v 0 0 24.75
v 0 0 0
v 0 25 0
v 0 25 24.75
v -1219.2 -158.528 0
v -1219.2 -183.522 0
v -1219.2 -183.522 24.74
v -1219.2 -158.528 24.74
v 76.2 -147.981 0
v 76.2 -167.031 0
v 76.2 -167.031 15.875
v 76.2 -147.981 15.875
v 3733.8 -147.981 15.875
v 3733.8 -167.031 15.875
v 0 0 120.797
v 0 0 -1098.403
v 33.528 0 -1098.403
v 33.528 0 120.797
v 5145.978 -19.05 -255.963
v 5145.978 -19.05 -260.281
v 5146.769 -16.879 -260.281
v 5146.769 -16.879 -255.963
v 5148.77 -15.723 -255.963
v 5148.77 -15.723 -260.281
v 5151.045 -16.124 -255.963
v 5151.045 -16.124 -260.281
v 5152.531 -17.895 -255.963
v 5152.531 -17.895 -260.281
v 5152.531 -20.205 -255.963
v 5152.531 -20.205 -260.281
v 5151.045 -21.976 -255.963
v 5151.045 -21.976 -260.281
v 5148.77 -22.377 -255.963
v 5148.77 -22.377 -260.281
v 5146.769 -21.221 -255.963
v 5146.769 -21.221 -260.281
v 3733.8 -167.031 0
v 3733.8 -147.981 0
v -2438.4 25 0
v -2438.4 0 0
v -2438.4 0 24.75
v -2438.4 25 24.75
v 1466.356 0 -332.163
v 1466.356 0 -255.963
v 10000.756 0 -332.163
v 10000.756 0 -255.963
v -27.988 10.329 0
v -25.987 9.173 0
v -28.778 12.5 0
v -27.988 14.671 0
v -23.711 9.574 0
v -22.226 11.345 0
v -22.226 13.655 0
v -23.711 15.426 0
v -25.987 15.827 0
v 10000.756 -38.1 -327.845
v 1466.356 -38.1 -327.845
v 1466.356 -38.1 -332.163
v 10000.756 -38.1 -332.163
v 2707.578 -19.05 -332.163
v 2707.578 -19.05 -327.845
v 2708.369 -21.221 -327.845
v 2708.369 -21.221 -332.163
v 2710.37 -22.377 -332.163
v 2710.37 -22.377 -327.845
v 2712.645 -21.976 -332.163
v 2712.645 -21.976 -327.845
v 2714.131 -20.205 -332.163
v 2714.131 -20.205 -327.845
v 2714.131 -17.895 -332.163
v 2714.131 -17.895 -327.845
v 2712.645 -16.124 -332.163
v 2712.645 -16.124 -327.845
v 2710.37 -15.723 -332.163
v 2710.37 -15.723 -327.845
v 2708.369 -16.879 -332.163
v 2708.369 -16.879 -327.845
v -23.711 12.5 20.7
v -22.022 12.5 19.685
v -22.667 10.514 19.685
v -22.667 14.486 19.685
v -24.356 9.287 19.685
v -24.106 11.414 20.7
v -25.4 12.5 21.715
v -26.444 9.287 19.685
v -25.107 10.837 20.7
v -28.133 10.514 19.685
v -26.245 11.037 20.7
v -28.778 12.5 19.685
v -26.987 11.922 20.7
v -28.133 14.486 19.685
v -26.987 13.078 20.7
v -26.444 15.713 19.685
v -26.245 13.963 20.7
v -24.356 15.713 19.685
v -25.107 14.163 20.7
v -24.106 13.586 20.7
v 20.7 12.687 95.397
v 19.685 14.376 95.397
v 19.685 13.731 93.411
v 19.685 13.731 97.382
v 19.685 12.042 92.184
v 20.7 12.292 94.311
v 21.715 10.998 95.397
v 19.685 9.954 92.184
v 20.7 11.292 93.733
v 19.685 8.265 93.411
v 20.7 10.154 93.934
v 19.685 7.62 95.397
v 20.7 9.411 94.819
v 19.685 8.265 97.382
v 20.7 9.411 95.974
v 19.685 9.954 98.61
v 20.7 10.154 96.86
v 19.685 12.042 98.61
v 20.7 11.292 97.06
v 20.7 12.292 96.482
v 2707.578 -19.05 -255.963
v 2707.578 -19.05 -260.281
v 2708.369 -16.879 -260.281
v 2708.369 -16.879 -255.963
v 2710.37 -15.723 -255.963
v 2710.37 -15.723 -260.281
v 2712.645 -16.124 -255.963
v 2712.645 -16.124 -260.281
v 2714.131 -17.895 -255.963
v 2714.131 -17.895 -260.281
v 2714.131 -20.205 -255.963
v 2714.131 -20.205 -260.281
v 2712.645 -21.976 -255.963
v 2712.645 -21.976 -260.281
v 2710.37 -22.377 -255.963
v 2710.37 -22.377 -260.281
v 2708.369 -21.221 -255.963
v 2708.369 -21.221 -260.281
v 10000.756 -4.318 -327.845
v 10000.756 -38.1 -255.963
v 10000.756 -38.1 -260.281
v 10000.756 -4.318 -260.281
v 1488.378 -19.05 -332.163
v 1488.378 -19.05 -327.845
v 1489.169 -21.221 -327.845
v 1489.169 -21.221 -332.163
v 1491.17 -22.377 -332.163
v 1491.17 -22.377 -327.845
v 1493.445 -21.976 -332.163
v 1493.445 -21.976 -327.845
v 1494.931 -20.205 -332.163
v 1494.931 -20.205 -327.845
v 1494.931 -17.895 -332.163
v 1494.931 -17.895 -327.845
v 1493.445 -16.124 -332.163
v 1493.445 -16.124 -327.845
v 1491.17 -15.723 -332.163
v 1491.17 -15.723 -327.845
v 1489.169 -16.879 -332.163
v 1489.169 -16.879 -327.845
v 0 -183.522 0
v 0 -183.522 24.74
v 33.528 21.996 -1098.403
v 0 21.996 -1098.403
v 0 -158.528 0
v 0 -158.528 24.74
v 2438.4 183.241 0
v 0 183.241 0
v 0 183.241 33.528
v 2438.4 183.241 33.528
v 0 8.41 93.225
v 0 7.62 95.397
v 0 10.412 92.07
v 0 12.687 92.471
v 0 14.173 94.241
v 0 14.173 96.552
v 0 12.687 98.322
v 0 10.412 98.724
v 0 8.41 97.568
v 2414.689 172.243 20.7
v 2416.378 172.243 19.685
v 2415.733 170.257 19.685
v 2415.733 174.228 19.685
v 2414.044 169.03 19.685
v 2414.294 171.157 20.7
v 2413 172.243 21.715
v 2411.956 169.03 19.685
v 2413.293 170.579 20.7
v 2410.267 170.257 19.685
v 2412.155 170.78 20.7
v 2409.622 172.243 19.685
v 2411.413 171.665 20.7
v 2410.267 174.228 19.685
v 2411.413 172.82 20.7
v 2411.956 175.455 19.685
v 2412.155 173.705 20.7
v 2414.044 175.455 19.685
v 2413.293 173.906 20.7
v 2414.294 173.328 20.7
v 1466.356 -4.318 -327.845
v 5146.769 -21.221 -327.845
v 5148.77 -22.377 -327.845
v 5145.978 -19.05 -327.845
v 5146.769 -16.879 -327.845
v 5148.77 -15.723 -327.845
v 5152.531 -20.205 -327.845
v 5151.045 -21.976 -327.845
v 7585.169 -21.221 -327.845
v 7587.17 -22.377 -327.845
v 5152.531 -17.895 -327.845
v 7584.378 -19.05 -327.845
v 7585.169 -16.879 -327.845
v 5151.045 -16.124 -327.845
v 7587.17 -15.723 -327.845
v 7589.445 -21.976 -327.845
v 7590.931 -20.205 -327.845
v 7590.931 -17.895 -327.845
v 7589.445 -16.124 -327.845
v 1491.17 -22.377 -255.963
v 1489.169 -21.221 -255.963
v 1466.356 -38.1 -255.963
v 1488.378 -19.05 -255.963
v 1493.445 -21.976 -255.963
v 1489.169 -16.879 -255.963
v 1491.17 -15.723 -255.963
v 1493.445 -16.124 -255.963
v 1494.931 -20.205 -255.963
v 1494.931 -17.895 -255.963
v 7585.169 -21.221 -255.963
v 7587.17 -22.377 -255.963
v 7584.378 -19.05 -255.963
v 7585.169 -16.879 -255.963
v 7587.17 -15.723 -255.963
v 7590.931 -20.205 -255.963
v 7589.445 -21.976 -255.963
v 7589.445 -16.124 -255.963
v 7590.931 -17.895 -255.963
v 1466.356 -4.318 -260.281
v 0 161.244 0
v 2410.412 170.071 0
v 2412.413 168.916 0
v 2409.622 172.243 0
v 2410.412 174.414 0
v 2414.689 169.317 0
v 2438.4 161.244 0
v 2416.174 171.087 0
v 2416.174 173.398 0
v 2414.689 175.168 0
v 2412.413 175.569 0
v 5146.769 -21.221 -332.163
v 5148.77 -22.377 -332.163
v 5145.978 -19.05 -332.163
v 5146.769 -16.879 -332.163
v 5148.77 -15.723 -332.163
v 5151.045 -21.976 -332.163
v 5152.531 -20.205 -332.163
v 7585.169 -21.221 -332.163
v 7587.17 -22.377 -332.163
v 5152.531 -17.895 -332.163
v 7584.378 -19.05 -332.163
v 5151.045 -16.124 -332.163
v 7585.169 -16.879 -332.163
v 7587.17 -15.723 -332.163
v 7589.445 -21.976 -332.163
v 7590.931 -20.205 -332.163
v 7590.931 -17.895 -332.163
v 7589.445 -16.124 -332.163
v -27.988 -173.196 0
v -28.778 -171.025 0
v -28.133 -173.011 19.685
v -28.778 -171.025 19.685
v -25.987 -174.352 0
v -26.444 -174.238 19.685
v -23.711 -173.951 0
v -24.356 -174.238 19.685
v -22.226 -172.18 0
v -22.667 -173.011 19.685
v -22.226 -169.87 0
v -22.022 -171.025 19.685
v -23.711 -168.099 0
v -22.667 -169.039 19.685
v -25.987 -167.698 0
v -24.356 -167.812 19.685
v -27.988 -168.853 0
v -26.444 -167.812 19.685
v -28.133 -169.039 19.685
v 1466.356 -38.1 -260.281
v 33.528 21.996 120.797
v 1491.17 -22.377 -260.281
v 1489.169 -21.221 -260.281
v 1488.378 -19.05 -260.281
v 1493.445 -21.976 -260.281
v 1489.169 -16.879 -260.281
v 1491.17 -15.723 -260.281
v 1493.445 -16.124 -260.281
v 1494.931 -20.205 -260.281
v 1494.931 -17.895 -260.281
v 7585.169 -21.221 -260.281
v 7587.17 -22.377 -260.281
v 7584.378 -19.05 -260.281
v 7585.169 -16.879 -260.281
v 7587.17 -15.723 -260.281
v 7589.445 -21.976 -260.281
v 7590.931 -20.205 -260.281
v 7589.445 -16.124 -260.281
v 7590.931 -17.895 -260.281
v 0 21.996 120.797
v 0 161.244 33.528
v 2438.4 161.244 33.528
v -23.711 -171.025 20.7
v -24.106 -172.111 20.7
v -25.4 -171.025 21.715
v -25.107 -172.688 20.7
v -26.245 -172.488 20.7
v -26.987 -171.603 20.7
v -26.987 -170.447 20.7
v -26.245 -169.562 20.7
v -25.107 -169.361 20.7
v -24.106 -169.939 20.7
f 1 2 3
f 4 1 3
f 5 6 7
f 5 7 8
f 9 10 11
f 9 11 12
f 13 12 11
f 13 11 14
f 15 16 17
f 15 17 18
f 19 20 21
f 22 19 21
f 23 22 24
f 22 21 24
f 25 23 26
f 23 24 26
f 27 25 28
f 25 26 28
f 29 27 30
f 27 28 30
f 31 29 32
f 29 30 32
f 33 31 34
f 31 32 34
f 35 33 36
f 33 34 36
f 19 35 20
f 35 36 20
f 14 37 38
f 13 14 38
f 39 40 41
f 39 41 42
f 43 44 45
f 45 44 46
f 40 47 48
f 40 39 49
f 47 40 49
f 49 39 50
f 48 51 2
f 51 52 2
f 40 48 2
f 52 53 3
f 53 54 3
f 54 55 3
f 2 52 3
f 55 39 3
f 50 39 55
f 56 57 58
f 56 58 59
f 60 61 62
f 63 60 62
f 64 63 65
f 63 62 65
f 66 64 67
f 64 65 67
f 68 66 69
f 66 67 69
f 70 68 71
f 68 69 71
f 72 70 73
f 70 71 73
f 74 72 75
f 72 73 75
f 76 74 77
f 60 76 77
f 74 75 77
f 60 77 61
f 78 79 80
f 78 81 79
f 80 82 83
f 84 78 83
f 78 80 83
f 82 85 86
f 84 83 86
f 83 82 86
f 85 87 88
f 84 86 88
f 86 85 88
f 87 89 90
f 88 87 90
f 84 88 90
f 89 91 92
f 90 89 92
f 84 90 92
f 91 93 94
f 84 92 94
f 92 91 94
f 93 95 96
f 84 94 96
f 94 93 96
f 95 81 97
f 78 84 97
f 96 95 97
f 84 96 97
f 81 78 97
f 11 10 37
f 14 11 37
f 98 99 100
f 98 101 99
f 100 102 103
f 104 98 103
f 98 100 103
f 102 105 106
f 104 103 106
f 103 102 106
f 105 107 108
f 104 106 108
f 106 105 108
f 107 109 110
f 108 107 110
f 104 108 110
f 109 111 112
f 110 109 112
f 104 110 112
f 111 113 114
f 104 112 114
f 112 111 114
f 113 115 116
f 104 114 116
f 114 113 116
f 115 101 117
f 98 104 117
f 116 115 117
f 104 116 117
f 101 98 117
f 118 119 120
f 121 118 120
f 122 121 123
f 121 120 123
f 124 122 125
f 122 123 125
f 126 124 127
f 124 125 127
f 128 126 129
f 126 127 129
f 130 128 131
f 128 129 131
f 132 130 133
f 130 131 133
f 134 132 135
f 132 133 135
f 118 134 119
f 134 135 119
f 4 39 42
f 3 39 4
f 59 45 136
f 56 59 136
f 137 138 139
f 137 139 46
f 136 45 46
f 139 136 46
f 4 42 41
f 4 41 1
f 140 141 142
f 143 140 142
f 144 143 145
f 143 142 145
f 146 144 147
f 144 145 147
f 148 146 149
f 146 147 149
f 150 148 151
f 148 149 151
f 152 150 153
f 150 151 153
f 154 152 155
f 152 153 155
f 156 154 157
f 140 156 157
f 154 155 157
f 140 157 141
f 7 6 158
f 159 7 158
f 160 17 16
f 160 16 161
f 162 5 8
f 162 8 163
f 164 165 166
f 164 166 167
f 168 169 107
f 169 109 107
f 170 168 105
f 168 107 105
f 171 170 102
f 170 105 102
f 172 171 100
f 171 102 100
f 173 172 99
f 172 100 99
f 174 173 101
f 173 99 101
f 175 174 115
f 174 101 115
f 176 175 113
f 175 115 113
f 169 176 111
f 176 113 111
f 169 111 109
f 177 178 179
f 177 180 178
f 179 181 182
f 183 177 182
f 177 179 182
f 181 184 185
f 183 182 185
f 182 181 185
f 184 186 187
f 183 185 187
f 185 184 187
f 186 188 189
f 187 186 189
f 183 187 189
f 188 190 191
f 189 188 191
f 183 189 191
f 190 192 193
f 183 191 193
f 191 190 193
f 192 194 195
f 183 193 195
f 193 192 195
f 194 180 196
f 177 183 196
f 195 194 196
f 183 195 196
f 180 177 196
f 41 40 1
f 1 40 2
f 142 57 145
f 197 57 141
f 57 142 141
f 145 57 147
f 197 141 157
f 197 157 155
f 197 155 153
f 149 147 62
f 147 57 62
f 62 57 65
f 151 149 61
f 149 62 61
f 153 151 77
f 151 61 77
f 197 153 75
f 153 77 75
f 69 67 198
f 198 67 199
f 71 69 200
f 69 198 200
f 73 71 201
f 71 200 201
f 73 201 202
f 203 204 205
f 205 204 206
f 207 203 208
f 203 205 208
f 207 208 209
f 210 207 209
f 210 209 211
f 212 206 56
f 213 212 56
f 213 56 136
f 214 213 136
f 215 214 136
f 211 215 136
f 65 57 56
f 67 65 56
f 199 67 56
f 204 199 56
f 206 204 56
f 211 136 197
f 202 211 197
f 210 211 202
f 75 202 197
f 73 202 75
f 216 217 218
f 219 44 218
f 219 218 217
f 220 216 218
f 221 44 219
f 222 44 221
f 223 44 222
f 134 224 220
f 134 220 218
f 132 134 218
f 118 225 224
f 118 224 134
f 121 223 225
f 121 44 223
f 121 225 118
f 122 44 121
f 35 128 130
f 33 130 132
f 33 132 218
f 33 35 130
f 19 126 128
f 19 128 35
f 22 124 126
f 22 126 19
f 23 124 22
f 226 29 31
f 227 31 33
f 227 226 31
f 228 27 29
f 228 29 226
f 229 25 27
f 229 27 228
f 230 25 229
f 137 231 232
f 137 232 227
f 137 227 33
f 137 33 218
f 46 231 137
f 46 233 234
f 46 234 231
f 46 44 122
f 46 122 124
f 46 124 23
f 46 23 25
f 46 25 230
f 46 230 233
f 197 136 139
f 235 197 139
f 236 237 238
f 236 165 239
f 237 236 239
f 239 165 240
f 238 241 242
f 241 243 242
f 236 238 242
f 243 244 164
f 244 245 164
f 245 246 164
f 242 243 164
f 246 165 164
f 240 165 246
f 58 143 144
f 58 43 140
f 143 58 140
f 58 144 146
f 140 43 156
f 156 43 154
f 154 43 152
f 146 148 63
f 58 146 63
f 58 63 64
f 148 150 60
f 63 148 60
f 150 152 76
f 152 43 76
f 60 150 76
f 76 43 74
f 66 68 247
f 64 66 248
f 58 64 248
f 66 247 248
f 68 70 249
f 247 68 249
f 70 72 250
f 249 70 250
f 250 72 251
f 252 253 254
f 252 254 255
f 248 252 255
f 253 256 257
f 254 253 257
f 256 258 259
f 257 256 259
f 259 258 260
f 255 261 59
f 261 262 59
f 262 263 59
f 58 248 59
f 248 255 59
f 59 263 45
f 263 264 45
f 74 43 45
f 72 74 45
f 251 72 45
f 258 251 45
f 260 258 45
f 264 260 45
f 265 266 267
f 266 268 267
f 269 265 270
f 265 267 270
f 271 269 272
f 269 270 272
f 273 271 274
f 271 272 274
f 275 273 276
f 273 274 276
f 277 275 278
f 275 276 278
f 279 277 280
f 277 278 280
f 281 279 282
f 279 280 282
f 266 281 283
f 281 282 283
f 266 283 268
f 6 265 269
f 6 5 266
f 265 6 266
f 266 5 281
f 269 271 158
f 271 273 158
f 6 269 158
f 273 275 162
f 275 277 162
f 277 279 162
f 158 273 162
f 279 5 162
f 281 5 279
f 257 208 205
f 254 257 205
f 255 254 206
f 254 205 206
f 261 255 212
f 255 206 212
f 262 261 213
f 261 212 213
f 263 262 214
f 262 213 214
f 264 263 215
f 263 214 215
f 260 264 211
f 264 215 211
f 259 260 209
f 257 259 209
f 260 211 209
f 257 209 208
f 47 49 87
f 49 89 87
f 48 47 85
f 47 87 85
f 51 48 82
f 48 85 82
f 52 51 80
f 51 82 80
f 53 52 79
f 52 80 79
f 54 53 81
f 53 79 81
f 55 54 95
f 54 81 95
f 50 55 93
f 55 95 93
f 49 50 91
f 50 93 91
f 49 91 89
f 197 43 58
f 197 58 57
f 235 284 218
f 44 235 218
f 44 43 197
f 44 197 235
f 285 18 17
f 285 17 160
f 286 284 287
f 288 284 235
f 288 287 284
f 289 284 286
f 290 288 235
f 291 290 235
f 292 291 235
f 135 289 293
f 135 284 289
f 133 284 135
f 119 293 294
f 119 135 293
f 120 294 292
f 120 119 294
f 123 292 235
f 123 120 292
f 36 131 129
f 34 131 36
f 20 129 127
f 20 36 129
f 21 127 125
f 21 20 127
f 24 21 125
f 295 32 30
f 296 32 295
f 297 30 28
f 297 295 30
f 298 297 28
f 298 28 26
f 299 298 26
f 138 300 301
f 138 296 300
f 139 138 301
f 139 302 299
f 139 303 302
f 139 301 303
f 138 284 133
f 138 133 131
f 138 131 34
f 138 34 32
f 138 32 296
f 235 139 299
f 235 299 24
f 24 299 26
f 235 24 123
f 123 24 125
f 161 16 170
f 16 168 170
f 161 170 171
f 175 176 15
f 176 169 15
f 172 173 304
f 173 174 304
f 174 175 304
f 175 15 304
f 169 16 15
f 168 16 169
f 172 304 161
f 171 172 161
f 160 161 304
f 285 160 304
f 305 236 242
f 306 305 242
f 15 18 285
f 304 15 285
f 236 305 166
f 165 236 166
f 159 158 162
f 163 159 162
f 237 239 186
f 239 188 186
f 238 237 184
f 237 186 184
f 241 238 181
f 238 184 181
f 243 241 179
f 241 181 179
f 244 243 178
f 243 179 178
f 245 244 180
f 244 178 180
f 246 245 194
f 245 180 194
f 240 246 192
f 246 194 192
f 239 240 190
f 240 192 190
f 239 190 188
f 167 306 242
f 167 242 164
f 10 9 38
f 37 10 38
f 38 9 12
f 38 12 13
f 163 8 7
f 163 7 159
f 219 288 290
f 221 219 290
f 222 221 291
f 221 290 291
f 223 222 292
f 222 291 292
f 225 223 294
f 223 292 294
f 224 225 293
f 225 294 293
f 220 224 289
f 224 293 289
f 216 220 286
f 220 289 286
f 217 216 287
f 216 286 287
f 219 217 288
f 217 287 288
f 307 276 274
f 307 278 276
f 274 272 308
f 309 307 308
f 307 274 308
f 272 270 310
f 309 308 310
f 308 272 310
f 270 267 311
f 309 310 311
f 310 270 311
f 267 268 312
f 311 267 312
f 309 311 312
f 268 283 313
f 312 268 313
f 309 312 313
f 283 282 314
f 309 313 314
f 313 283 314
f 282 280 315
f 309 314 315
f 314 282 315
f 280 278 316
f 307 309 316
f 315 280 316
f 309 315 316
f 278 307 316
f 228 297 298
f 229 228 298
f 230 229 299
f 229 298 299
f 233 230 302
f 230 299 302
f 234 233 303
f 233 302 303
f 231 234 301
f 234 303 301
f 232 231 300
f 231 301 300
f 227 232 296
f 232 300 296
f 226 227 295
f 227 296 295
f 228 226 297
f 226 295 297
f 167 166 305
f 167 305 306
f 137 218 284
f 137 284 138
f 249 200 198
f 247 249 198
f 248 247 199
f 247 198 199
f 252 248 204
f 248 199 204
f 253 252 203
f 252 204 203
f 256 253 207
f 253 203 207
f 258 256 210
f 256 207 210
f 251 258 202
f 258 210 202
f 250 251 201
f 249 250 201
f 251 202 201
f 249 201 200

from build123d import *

# Parameters (mm, degrees)
F0_W             = 2438.4
F0_H             = 25
F1_DEPTH         = 24.74976
F2_W             = 3657.6
F2_H             = 19.05
F3_DEPTH         = 15.875
F4_W             = 2438.4
F4_H             = 21.9964
F5_DEPTH         = 33.528
F6_W             = 21.9964
F6_H             = 1219.2
F7_DEPTH         = 33.528
F8_W             = 8534.4
F8_H             = 76.2
F9_DEPTH         = 38.1
F10_W            = 67.564
F10_H            = 67.564
F11_DEPTH        = 8534.4
F14_D            = 6.7564
F14_DEPTH        = 19.685
F14_TIP          = 2.0298273432
F14_ON_F12_D     = 6.7564
F14_ON_F12_DEPTH = 19.685
F14_ON_F12_TIP   = 2.0298273432
F15_D            = 6.7564
F15_DEPTH        = 19.685
F15_TIP          = 2.0298273432
F16_D            = 6.7564
F16_DEPTH        = 19.685
F16_TIP          = 2.0298273432
F17_W            = 1219.2
F17_H            = 24.9936
F18_DEPTH        = 24.7396
F19_D            = 6.7564
F19_DEPTH        = 19.685
F19_TIP          = 2.0298273432
F20_D            = 6.7564
F20_DEPTH        = 19.685
F20_TIP          = 2.0298273432
F21_D            = 6.7564
F21_DEPTH        = 19.685
F21_TIP          = 2.0298273432
F22_D            = 6.7564
F22_DEPTH        = 19.685
F22_TIP          = 2.0298273432


with BuildPart() as f1:
    # F0 (on Top) → F1 (new body)
    with BuildSketch(Plane.XY):
        with Locations((-1219.2, 12.5)):
            Rectangle(F0_W, F0_H)
    extrude(amount=F1_DEPTH)

    # F20
    with Locations(Plane(origin=(0, 0, 0), x_dir=(1, 0, 0), z_dir=(0, 0, -1))):
        with Locations((-25.4, -12.5)):
            Hole(F20_D / 2, depth=F20_DEPTH)
            with Locations((0, 0, -(F20_DEPTH + F20_TIP / 2))):  # 118° drill point
                Cone(0, F20_D / 2, F20_TIP, mode=Mode.SUBTRACT)


with BuildPart() as f3:
    # F2 (on Top) → F3 (new body)
    with BuildSketch(Plane.XY):
        with Locations((1905, -157.5062781825)):
            Rectangle(F2_W, F2_H)
    extrude(amount=F3_DEPTH)


with BuildPart() as f5:
    # F4 (on Top) → F5 (new body)
    with BuildSketch(Plane.XY):
        with Locations((1219.2, 172.2425887634)):
            Rectangle(F4_W, F4_H)
    extrude(amount=F5_DEPTH)

    # F21
    with Locations(Plane(origin=(0, 0, 0), x_dir=(1, 0, 0), z_dir=(0, 0, -1))):
        with Locations((2413, -172.2425887634)):
            Hole(F21_D / 2, depth=F21_DEPTH)
            with Locations((0, 0, -(F21_DEPTH + F21_TIP / 2))):  # 118° drill point
                Cone(0, F21_D / 2, F21_TIP, mode=Mode.SUBTRACT)


with BuildPart() as f7:
    # F6 (on Right) → F7 (new body)
    with BuildSketch(Plane.YZ):
        with Locations((10.9982, -488.8032363863)):
            Rectangle(F6_W, F6_H)
    extrude(amount=F7_DEPTH)

    # F22
    with Locations(Plane(origin=(0, 0, 0), x_dir=(0, 1, 0), z_dir=(-1, 0, 0))):
        with Locations((10.9982, -95.3967636137)):
            Hole(F22_D / 2, depth=F22_DEPTH)
            with Locations((0, 0, -(F22_DEPTH + F22_TIP / 2))):  # 118° drill point
                Cone(0, F22_D / 2, F22_TIP, mode=Mode.SUBTRACT)


with BuildPart() as f9:
    # F8 (on Front) → F9 (new body)
    with BuildSketch(Plane.XZ):
        with Locations((5733.5563790322, -294.0629060984)):
            Rectangle(F8_W, F8_H)
    extrude(amount=F9_DEPTH)

    # F10 (on face) → F11 (cut)
    with BuildSketch(Plane.YZ.offset(10000.7563790322)):
        with Locations((-38.1, -294.0629060984)):
            Rectangle(F10_W, F10_H)
    extrude(amount=-F11_DEPTH, mode=Mode.SUBTRACT)

    # F14
    with Locations(Plane(origin=(0, 0, -332.1629060984), x_dir=(1, 0, 0), z_dir=(0, 0, -1))):
        with Locations((1491.7563790322, 19.05)):
            Hole(F14_D / 2, depth=F14_DEPTH)
            with Locations((0, 0, -(F14_DEPTH + F14_TIP / 2))):  # 118° drill point
                Cone(0, F14_D / 2, F14_TIP, mode=Mode.SUBTRACT)

    # F14 on F12
    with Locations(Plane.XY.offset(-255.9629060984)):
        with Locations((1491.7563790322, -19.05)):
            Hole(F14_ON_F12_D / 2, depth=F14_ON_F12_DEPTH)
            with Locations((0, 0, -(F14_ON_F12_DEPTH + F14_ON_F12_TIP / 2))):  # 118° drill point
                Cone(0, F14_ON_F12_D / 2, F14_ON_F12_TIP, mode=Mode.SUBTRACT)

    # F15
    with Locations(Plane(origin=(0, 0, -332.1629060984), x_dir=(1, 0, 0), z_dir=(0, 0, -1))):
        with Locations((2710.9563790322, 19.05), (5149.3563790322, 19.05), (7587.7563790322, 19.05)):
            Hole(F15_D / 2, depth=F15_DEPTH)
            with Locations((0, 0, -(F15_DEPTH + F15_TIP / 2))):  # 118° drill point
                Cone(0, F15_D / 2, F15_TIP, mode=Mode.SUBTRACT)

    # F16
    with Locations(Plane.XY.offset(-255.9629060984)):
        with Locations((1491.7563790322, -19.05), (2710.9563790322, -19.05), (5149.3563790322, -19.05), (7587.7563790322, -19.05)):
            Hole(F16_D / 2, depth=F16_DEPTH)
            with Locations((0, 0, -(F16_DEPTH + F16_TIP / 2))):  # 118° drill point
                Cone(0, F16_D / 2, F16_TIP, mode=Mode.SUBTRACT)


with BuildPart() as f18:
    # F17 (on Top) → F18 (new body)
    with BuildSketch(Plane.XY):
        with Locations((-609.6, -171.0249129638)):
            Rectangle(F17_W, F17_H)
    extrude(amount=F18_DEPTH)

    # F19
    with Locations(Plane(origin=(0, 0, 0), x_dir=(1, 0, 0), z_dir=(0, 0, -1))):
        with Locations((-25.4, 171.0249129638)):
            Hole(F19_D / 2, depth=F19_DEPTH)
            with Locations((0, 0, -(F19_DEPTH + F19_TIP / 2))):  # 118° drill point
                Cone(0, F19_D / 2, F19_TIP, mode=Mode.SUBTRACT)


solid = Compound([f1.part, f3.part, f5.part, f7.part, f9.part, f18.part])
